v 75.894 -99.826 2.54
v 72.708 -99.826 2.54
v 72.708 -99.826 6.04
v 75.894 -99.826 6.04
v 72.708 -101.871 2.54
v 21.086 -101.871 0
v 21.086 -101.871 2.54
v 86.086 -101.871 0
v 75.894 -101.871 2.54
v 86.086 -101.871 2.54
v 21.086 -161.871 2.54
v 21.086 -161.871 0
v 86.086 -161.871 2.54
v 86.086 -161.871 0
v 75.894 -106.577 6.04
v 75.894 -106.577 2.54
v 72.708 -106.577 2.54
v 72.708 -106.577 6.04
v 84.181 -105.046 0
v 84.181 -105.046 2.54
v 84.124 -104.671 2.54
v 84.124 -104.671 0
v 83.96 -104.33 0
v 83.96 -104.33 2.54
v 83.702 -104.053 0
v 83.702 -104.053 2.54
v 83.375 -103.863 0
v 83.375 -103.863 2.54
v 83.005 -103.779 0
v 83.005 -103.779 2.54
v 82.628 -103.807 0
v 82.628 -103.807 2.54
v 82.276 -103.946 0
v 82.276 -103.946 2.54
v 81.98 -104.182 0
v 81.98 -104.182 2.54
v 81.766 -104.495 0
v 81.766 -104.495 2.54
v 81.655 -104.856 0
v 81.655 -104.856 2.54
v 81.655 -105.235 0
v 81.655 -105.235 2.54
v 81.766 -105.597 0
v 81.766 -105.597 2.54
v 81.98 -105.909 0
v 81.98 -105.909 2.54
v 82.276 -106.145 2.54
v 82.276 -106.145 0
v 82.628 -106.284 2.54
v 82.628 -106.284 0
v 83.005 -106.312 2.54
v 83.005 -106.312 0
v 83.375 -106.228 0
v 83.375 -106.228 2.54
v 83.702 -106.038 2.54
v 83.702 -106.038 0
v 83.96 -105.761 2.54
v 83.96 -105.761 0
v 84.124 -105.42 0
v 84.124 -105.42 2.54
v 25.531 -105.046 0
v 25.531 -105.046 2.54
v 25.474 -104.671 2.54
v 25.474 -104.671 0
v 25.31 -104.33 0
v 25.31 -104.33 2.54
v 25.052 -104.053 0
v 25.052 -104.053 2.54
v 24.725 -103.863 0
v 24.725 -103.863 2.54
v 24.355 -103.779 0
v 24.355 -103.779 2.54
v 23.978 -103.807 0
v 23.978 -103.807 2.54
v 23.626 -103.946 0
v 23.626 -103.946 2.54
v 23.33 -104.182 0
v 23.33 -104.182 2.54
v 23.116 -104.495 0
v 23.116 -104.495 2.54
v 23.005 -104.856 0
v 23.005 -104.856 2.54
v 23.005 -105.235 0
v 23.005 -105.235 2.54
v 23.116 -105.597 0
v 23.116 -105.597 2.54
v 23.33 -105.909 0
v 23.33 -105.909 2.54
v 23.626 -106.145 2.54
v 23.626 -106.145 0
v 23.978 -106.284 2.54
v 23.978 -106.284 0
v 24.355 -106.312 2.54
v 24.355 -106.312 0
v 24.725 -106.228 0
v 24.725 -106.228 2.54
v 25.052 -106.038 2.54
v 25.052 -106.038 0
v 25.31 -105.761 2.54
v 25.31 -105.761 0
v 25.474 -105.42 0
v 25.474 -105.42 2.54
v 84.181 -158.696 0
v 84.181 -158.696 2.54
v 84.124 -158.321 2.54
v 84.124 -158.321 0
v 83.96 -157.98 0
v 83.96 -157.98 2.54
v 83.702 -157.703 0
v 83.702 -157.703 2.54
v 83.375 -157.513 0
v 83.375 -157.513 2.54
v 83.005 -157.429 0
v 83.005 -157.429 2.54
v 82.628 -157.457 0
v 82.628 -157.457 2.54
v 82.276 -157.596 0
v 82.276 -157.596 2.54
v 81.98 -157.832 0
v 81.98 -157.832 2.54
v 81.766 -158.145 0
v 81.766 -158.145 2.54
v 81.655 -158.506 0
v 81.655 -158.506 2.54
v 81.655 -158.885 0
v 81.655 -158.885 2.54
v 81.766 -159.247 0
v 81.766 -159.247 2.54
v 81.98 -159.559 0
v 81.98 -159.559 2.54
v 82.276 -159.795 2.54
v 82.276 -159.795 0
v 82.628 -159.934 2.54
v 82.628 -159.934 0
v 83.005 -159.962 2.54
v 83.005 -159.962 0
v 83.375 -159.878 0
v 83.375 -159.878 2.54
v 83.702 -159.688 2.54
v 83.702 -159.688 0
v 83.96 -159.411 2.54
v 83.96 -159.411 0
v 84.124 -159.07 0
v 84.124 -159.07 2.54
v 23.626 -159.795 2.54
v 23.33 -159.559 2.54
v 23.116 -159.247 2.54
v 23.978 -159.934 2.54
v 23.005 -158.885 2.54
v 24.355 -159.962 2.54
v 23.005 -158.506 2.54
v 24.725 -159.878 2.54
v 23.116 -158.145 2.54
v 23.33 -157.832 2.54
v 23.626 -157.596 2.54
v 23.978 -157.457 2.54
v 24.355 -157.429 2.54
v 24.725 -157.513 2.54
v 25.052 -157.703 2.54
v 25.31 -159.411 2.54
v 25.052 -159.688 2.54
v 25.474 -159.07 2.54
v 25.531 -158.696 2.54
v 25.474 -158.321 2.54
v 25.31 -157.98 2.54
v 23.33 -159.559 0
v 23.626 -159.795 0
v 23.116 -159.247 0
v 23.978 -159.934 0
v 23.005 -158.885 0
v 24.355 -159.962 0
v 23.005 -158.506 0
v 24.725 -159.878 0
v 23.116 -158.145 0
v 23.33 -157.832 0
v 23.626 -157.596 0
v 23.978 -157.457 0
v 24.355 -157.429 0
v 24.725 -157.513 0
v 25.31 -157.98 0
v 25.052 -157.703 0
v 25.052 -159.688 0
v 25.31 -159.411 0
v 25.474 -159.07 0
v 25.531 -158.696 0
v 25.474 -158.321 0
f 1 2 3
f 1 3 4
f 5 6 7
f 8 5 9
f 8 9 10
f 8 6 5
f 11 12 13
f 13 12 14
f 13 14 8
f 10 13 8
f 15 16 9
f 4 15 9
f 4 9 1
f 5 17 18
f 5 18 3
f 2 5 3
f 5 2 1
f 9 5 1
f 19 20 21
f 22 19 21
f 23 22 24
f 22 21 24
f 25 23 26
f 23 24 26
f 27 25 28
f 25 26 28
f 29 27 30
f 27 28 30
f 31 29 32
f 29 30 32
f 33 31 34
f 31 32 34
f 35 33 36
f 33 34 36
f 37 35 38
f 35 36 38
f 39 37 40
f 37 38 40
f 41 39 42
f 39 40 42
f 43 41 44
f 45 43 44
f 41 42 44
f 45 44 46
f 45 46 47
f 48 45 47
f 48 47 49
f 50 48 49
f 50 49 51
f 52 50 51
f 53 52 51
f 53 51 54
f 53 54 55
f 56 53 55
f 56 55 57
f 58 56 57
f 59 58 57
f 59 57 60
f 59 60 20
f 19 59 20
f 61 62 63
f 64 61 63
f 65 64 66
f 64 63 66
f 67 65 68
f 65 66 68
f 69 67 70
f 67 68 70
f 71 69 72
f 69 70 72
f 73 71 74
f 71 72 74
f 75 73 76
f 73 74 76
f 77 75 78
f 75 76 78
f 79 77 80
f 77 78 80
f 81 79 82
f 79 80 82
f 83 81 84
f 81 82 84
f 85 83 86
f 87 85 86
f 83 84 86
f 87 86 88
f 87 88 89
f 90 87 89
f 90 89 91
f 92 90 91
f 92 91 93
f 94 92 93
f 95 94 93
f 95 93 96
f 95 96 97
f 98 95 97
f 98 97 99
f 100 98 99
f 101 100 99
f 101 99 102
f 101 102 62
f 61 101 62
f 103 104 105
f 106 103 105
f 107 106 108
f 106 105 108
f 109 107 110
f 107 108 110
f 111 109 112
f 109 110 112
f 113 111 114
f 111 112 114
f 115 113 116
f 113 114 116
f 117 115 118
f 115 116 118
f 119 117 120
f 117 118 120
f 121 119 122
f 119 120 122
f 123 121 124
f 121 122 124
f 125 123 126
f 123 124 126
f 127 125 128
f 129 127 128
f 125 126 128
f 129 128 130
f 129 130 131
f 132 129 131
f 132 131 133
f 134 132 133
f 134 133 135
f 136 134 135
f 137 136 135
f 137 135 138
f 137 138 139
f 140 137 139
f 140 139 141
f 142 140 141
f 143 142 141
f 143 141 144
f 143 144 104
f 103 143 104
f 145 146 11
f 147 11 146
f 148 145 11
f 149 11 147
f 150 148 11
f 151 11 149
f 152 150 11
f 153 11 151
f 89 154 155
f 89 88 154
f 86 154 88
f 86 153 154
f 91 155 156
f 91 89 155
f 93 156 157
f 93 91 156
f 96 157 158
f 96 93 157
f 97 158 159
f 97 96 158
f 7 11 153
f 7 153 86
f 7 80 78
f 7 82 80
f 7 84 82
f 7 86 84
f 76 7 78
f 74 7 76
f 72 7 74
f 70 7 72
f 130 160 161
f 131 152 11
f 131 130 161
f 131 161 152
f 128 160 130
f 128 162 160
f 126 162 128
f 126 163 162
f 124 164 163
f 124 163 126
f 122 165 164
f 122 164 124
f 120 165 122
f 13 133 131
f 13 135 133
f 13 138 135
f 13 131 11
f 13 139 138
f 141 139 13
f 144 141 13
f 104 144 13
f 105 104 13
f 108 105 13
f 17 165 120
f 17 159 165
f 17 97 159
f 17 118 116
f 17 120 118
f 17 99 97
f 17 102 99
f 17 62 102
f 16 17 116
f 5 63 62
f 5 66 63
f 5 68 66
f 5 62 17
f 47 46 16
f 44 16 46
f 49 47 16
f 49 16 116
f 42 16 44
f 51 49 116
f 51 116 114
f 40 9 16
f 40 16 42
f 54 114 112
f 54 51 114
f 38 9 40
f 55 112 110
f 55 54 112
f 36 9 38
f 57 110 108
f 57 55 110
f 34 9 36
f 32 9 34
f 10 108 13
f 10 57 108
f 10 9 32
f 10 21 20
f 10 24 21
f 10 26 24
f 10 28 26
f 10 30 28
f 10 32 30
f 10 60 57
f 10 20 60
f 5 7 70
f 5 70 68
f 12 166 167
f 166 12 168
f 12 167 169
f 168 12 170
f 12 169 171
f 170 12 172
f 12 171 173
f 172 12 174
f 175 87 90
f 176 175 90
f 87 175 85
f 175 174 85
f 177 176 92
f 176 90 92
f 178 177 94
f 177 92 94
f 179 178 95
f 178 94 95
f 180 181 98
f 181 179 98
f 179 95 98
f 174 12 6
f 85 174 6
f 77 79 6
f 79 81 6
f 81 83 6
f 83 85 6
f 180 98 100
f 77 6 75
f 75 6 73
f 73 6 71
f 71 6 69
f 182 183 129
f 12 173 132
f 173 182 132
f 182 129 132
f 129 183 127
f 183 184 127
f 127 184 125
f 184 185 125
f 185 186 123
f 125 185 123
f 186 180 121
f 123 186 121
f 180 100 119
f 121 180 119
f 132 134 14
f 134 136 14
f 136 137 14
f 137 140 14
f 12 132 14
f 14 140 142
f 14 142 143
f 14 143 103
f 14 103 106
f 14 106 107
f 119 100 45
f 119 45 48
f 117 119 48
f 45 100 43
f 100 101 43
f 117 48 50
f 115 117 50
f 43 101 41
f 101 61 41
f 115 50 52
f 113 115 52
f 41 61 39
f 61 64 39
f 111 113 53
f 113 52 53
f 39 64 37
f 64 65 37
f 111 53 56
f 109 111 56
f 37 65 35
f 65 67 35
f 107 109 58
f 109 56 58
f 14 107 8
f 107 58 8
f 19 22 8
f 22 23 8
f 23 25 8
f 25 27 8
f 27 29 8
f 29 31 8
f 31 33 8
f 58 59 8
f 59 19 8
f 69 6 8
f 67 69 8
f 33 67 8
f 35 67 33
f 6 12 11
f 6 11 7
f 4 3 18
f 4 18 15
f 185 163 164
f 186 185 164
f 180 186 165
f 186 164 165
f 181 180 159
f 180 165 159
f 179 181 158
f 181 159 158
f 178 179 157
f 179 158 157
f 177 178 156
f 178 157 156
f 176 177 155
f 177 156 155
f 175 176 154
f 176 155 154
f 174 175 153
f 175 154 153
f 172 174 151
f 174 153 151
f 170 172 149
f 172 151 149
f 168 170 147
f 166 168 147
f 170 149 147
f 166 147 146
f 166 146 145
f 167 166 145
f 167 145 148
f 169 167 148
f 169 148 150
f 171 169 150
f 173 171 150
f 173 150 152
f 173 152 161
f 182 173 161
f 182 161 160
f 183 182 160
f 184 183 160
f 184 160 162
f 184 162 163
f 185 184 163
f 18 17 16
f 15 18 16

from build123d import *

# Parameters (mm, degrees)
F0_W     = 65
F0_H     = 60
F1_DEPTH = 2.54
F2_R     = 1.27
F3_DEPTH = 2.541
F4_W     = 3.186375
F4_H     = 6.750785
F5_DEPTH = 3.5


with BuildPart() as f1:
    # F0 (on Top) → F1 (new body)
    with BuildSketch(Plane.XY):
        with Locations((53.585585, -131.870539)):
            Rectangle(F0_W, F0_H)
    extrude(amount=F1_DEPTH)

    # F2 (on face) → F3 (cut, through all)
    with BuildSketch(Plane.XY.offset(2.54)):
        with Locations((24.260585, -105.045539)):
            Circle(F2_R)
        with Locations((82.910585, -105.045539)):
            Circle(F2_R)
        with Locations((82.910585, -158.695539)):
            Circle(F2_R)
        with Locations((24.260585, -158.695539)):
            Circle(F2_R)
    extrude(amount=-F3_DEPTH, mode=Mode.SUBTRACT)

    # F4 (on face) → F5 (join)
    with BuildSketch(Plane.XY.offset(2.54)):
        with Locations((74.301257, -103.201653)):
            Rectangle(F4_W, F4_H)
    extrude(amount=F5_DEPTH)


solid = f1.part
